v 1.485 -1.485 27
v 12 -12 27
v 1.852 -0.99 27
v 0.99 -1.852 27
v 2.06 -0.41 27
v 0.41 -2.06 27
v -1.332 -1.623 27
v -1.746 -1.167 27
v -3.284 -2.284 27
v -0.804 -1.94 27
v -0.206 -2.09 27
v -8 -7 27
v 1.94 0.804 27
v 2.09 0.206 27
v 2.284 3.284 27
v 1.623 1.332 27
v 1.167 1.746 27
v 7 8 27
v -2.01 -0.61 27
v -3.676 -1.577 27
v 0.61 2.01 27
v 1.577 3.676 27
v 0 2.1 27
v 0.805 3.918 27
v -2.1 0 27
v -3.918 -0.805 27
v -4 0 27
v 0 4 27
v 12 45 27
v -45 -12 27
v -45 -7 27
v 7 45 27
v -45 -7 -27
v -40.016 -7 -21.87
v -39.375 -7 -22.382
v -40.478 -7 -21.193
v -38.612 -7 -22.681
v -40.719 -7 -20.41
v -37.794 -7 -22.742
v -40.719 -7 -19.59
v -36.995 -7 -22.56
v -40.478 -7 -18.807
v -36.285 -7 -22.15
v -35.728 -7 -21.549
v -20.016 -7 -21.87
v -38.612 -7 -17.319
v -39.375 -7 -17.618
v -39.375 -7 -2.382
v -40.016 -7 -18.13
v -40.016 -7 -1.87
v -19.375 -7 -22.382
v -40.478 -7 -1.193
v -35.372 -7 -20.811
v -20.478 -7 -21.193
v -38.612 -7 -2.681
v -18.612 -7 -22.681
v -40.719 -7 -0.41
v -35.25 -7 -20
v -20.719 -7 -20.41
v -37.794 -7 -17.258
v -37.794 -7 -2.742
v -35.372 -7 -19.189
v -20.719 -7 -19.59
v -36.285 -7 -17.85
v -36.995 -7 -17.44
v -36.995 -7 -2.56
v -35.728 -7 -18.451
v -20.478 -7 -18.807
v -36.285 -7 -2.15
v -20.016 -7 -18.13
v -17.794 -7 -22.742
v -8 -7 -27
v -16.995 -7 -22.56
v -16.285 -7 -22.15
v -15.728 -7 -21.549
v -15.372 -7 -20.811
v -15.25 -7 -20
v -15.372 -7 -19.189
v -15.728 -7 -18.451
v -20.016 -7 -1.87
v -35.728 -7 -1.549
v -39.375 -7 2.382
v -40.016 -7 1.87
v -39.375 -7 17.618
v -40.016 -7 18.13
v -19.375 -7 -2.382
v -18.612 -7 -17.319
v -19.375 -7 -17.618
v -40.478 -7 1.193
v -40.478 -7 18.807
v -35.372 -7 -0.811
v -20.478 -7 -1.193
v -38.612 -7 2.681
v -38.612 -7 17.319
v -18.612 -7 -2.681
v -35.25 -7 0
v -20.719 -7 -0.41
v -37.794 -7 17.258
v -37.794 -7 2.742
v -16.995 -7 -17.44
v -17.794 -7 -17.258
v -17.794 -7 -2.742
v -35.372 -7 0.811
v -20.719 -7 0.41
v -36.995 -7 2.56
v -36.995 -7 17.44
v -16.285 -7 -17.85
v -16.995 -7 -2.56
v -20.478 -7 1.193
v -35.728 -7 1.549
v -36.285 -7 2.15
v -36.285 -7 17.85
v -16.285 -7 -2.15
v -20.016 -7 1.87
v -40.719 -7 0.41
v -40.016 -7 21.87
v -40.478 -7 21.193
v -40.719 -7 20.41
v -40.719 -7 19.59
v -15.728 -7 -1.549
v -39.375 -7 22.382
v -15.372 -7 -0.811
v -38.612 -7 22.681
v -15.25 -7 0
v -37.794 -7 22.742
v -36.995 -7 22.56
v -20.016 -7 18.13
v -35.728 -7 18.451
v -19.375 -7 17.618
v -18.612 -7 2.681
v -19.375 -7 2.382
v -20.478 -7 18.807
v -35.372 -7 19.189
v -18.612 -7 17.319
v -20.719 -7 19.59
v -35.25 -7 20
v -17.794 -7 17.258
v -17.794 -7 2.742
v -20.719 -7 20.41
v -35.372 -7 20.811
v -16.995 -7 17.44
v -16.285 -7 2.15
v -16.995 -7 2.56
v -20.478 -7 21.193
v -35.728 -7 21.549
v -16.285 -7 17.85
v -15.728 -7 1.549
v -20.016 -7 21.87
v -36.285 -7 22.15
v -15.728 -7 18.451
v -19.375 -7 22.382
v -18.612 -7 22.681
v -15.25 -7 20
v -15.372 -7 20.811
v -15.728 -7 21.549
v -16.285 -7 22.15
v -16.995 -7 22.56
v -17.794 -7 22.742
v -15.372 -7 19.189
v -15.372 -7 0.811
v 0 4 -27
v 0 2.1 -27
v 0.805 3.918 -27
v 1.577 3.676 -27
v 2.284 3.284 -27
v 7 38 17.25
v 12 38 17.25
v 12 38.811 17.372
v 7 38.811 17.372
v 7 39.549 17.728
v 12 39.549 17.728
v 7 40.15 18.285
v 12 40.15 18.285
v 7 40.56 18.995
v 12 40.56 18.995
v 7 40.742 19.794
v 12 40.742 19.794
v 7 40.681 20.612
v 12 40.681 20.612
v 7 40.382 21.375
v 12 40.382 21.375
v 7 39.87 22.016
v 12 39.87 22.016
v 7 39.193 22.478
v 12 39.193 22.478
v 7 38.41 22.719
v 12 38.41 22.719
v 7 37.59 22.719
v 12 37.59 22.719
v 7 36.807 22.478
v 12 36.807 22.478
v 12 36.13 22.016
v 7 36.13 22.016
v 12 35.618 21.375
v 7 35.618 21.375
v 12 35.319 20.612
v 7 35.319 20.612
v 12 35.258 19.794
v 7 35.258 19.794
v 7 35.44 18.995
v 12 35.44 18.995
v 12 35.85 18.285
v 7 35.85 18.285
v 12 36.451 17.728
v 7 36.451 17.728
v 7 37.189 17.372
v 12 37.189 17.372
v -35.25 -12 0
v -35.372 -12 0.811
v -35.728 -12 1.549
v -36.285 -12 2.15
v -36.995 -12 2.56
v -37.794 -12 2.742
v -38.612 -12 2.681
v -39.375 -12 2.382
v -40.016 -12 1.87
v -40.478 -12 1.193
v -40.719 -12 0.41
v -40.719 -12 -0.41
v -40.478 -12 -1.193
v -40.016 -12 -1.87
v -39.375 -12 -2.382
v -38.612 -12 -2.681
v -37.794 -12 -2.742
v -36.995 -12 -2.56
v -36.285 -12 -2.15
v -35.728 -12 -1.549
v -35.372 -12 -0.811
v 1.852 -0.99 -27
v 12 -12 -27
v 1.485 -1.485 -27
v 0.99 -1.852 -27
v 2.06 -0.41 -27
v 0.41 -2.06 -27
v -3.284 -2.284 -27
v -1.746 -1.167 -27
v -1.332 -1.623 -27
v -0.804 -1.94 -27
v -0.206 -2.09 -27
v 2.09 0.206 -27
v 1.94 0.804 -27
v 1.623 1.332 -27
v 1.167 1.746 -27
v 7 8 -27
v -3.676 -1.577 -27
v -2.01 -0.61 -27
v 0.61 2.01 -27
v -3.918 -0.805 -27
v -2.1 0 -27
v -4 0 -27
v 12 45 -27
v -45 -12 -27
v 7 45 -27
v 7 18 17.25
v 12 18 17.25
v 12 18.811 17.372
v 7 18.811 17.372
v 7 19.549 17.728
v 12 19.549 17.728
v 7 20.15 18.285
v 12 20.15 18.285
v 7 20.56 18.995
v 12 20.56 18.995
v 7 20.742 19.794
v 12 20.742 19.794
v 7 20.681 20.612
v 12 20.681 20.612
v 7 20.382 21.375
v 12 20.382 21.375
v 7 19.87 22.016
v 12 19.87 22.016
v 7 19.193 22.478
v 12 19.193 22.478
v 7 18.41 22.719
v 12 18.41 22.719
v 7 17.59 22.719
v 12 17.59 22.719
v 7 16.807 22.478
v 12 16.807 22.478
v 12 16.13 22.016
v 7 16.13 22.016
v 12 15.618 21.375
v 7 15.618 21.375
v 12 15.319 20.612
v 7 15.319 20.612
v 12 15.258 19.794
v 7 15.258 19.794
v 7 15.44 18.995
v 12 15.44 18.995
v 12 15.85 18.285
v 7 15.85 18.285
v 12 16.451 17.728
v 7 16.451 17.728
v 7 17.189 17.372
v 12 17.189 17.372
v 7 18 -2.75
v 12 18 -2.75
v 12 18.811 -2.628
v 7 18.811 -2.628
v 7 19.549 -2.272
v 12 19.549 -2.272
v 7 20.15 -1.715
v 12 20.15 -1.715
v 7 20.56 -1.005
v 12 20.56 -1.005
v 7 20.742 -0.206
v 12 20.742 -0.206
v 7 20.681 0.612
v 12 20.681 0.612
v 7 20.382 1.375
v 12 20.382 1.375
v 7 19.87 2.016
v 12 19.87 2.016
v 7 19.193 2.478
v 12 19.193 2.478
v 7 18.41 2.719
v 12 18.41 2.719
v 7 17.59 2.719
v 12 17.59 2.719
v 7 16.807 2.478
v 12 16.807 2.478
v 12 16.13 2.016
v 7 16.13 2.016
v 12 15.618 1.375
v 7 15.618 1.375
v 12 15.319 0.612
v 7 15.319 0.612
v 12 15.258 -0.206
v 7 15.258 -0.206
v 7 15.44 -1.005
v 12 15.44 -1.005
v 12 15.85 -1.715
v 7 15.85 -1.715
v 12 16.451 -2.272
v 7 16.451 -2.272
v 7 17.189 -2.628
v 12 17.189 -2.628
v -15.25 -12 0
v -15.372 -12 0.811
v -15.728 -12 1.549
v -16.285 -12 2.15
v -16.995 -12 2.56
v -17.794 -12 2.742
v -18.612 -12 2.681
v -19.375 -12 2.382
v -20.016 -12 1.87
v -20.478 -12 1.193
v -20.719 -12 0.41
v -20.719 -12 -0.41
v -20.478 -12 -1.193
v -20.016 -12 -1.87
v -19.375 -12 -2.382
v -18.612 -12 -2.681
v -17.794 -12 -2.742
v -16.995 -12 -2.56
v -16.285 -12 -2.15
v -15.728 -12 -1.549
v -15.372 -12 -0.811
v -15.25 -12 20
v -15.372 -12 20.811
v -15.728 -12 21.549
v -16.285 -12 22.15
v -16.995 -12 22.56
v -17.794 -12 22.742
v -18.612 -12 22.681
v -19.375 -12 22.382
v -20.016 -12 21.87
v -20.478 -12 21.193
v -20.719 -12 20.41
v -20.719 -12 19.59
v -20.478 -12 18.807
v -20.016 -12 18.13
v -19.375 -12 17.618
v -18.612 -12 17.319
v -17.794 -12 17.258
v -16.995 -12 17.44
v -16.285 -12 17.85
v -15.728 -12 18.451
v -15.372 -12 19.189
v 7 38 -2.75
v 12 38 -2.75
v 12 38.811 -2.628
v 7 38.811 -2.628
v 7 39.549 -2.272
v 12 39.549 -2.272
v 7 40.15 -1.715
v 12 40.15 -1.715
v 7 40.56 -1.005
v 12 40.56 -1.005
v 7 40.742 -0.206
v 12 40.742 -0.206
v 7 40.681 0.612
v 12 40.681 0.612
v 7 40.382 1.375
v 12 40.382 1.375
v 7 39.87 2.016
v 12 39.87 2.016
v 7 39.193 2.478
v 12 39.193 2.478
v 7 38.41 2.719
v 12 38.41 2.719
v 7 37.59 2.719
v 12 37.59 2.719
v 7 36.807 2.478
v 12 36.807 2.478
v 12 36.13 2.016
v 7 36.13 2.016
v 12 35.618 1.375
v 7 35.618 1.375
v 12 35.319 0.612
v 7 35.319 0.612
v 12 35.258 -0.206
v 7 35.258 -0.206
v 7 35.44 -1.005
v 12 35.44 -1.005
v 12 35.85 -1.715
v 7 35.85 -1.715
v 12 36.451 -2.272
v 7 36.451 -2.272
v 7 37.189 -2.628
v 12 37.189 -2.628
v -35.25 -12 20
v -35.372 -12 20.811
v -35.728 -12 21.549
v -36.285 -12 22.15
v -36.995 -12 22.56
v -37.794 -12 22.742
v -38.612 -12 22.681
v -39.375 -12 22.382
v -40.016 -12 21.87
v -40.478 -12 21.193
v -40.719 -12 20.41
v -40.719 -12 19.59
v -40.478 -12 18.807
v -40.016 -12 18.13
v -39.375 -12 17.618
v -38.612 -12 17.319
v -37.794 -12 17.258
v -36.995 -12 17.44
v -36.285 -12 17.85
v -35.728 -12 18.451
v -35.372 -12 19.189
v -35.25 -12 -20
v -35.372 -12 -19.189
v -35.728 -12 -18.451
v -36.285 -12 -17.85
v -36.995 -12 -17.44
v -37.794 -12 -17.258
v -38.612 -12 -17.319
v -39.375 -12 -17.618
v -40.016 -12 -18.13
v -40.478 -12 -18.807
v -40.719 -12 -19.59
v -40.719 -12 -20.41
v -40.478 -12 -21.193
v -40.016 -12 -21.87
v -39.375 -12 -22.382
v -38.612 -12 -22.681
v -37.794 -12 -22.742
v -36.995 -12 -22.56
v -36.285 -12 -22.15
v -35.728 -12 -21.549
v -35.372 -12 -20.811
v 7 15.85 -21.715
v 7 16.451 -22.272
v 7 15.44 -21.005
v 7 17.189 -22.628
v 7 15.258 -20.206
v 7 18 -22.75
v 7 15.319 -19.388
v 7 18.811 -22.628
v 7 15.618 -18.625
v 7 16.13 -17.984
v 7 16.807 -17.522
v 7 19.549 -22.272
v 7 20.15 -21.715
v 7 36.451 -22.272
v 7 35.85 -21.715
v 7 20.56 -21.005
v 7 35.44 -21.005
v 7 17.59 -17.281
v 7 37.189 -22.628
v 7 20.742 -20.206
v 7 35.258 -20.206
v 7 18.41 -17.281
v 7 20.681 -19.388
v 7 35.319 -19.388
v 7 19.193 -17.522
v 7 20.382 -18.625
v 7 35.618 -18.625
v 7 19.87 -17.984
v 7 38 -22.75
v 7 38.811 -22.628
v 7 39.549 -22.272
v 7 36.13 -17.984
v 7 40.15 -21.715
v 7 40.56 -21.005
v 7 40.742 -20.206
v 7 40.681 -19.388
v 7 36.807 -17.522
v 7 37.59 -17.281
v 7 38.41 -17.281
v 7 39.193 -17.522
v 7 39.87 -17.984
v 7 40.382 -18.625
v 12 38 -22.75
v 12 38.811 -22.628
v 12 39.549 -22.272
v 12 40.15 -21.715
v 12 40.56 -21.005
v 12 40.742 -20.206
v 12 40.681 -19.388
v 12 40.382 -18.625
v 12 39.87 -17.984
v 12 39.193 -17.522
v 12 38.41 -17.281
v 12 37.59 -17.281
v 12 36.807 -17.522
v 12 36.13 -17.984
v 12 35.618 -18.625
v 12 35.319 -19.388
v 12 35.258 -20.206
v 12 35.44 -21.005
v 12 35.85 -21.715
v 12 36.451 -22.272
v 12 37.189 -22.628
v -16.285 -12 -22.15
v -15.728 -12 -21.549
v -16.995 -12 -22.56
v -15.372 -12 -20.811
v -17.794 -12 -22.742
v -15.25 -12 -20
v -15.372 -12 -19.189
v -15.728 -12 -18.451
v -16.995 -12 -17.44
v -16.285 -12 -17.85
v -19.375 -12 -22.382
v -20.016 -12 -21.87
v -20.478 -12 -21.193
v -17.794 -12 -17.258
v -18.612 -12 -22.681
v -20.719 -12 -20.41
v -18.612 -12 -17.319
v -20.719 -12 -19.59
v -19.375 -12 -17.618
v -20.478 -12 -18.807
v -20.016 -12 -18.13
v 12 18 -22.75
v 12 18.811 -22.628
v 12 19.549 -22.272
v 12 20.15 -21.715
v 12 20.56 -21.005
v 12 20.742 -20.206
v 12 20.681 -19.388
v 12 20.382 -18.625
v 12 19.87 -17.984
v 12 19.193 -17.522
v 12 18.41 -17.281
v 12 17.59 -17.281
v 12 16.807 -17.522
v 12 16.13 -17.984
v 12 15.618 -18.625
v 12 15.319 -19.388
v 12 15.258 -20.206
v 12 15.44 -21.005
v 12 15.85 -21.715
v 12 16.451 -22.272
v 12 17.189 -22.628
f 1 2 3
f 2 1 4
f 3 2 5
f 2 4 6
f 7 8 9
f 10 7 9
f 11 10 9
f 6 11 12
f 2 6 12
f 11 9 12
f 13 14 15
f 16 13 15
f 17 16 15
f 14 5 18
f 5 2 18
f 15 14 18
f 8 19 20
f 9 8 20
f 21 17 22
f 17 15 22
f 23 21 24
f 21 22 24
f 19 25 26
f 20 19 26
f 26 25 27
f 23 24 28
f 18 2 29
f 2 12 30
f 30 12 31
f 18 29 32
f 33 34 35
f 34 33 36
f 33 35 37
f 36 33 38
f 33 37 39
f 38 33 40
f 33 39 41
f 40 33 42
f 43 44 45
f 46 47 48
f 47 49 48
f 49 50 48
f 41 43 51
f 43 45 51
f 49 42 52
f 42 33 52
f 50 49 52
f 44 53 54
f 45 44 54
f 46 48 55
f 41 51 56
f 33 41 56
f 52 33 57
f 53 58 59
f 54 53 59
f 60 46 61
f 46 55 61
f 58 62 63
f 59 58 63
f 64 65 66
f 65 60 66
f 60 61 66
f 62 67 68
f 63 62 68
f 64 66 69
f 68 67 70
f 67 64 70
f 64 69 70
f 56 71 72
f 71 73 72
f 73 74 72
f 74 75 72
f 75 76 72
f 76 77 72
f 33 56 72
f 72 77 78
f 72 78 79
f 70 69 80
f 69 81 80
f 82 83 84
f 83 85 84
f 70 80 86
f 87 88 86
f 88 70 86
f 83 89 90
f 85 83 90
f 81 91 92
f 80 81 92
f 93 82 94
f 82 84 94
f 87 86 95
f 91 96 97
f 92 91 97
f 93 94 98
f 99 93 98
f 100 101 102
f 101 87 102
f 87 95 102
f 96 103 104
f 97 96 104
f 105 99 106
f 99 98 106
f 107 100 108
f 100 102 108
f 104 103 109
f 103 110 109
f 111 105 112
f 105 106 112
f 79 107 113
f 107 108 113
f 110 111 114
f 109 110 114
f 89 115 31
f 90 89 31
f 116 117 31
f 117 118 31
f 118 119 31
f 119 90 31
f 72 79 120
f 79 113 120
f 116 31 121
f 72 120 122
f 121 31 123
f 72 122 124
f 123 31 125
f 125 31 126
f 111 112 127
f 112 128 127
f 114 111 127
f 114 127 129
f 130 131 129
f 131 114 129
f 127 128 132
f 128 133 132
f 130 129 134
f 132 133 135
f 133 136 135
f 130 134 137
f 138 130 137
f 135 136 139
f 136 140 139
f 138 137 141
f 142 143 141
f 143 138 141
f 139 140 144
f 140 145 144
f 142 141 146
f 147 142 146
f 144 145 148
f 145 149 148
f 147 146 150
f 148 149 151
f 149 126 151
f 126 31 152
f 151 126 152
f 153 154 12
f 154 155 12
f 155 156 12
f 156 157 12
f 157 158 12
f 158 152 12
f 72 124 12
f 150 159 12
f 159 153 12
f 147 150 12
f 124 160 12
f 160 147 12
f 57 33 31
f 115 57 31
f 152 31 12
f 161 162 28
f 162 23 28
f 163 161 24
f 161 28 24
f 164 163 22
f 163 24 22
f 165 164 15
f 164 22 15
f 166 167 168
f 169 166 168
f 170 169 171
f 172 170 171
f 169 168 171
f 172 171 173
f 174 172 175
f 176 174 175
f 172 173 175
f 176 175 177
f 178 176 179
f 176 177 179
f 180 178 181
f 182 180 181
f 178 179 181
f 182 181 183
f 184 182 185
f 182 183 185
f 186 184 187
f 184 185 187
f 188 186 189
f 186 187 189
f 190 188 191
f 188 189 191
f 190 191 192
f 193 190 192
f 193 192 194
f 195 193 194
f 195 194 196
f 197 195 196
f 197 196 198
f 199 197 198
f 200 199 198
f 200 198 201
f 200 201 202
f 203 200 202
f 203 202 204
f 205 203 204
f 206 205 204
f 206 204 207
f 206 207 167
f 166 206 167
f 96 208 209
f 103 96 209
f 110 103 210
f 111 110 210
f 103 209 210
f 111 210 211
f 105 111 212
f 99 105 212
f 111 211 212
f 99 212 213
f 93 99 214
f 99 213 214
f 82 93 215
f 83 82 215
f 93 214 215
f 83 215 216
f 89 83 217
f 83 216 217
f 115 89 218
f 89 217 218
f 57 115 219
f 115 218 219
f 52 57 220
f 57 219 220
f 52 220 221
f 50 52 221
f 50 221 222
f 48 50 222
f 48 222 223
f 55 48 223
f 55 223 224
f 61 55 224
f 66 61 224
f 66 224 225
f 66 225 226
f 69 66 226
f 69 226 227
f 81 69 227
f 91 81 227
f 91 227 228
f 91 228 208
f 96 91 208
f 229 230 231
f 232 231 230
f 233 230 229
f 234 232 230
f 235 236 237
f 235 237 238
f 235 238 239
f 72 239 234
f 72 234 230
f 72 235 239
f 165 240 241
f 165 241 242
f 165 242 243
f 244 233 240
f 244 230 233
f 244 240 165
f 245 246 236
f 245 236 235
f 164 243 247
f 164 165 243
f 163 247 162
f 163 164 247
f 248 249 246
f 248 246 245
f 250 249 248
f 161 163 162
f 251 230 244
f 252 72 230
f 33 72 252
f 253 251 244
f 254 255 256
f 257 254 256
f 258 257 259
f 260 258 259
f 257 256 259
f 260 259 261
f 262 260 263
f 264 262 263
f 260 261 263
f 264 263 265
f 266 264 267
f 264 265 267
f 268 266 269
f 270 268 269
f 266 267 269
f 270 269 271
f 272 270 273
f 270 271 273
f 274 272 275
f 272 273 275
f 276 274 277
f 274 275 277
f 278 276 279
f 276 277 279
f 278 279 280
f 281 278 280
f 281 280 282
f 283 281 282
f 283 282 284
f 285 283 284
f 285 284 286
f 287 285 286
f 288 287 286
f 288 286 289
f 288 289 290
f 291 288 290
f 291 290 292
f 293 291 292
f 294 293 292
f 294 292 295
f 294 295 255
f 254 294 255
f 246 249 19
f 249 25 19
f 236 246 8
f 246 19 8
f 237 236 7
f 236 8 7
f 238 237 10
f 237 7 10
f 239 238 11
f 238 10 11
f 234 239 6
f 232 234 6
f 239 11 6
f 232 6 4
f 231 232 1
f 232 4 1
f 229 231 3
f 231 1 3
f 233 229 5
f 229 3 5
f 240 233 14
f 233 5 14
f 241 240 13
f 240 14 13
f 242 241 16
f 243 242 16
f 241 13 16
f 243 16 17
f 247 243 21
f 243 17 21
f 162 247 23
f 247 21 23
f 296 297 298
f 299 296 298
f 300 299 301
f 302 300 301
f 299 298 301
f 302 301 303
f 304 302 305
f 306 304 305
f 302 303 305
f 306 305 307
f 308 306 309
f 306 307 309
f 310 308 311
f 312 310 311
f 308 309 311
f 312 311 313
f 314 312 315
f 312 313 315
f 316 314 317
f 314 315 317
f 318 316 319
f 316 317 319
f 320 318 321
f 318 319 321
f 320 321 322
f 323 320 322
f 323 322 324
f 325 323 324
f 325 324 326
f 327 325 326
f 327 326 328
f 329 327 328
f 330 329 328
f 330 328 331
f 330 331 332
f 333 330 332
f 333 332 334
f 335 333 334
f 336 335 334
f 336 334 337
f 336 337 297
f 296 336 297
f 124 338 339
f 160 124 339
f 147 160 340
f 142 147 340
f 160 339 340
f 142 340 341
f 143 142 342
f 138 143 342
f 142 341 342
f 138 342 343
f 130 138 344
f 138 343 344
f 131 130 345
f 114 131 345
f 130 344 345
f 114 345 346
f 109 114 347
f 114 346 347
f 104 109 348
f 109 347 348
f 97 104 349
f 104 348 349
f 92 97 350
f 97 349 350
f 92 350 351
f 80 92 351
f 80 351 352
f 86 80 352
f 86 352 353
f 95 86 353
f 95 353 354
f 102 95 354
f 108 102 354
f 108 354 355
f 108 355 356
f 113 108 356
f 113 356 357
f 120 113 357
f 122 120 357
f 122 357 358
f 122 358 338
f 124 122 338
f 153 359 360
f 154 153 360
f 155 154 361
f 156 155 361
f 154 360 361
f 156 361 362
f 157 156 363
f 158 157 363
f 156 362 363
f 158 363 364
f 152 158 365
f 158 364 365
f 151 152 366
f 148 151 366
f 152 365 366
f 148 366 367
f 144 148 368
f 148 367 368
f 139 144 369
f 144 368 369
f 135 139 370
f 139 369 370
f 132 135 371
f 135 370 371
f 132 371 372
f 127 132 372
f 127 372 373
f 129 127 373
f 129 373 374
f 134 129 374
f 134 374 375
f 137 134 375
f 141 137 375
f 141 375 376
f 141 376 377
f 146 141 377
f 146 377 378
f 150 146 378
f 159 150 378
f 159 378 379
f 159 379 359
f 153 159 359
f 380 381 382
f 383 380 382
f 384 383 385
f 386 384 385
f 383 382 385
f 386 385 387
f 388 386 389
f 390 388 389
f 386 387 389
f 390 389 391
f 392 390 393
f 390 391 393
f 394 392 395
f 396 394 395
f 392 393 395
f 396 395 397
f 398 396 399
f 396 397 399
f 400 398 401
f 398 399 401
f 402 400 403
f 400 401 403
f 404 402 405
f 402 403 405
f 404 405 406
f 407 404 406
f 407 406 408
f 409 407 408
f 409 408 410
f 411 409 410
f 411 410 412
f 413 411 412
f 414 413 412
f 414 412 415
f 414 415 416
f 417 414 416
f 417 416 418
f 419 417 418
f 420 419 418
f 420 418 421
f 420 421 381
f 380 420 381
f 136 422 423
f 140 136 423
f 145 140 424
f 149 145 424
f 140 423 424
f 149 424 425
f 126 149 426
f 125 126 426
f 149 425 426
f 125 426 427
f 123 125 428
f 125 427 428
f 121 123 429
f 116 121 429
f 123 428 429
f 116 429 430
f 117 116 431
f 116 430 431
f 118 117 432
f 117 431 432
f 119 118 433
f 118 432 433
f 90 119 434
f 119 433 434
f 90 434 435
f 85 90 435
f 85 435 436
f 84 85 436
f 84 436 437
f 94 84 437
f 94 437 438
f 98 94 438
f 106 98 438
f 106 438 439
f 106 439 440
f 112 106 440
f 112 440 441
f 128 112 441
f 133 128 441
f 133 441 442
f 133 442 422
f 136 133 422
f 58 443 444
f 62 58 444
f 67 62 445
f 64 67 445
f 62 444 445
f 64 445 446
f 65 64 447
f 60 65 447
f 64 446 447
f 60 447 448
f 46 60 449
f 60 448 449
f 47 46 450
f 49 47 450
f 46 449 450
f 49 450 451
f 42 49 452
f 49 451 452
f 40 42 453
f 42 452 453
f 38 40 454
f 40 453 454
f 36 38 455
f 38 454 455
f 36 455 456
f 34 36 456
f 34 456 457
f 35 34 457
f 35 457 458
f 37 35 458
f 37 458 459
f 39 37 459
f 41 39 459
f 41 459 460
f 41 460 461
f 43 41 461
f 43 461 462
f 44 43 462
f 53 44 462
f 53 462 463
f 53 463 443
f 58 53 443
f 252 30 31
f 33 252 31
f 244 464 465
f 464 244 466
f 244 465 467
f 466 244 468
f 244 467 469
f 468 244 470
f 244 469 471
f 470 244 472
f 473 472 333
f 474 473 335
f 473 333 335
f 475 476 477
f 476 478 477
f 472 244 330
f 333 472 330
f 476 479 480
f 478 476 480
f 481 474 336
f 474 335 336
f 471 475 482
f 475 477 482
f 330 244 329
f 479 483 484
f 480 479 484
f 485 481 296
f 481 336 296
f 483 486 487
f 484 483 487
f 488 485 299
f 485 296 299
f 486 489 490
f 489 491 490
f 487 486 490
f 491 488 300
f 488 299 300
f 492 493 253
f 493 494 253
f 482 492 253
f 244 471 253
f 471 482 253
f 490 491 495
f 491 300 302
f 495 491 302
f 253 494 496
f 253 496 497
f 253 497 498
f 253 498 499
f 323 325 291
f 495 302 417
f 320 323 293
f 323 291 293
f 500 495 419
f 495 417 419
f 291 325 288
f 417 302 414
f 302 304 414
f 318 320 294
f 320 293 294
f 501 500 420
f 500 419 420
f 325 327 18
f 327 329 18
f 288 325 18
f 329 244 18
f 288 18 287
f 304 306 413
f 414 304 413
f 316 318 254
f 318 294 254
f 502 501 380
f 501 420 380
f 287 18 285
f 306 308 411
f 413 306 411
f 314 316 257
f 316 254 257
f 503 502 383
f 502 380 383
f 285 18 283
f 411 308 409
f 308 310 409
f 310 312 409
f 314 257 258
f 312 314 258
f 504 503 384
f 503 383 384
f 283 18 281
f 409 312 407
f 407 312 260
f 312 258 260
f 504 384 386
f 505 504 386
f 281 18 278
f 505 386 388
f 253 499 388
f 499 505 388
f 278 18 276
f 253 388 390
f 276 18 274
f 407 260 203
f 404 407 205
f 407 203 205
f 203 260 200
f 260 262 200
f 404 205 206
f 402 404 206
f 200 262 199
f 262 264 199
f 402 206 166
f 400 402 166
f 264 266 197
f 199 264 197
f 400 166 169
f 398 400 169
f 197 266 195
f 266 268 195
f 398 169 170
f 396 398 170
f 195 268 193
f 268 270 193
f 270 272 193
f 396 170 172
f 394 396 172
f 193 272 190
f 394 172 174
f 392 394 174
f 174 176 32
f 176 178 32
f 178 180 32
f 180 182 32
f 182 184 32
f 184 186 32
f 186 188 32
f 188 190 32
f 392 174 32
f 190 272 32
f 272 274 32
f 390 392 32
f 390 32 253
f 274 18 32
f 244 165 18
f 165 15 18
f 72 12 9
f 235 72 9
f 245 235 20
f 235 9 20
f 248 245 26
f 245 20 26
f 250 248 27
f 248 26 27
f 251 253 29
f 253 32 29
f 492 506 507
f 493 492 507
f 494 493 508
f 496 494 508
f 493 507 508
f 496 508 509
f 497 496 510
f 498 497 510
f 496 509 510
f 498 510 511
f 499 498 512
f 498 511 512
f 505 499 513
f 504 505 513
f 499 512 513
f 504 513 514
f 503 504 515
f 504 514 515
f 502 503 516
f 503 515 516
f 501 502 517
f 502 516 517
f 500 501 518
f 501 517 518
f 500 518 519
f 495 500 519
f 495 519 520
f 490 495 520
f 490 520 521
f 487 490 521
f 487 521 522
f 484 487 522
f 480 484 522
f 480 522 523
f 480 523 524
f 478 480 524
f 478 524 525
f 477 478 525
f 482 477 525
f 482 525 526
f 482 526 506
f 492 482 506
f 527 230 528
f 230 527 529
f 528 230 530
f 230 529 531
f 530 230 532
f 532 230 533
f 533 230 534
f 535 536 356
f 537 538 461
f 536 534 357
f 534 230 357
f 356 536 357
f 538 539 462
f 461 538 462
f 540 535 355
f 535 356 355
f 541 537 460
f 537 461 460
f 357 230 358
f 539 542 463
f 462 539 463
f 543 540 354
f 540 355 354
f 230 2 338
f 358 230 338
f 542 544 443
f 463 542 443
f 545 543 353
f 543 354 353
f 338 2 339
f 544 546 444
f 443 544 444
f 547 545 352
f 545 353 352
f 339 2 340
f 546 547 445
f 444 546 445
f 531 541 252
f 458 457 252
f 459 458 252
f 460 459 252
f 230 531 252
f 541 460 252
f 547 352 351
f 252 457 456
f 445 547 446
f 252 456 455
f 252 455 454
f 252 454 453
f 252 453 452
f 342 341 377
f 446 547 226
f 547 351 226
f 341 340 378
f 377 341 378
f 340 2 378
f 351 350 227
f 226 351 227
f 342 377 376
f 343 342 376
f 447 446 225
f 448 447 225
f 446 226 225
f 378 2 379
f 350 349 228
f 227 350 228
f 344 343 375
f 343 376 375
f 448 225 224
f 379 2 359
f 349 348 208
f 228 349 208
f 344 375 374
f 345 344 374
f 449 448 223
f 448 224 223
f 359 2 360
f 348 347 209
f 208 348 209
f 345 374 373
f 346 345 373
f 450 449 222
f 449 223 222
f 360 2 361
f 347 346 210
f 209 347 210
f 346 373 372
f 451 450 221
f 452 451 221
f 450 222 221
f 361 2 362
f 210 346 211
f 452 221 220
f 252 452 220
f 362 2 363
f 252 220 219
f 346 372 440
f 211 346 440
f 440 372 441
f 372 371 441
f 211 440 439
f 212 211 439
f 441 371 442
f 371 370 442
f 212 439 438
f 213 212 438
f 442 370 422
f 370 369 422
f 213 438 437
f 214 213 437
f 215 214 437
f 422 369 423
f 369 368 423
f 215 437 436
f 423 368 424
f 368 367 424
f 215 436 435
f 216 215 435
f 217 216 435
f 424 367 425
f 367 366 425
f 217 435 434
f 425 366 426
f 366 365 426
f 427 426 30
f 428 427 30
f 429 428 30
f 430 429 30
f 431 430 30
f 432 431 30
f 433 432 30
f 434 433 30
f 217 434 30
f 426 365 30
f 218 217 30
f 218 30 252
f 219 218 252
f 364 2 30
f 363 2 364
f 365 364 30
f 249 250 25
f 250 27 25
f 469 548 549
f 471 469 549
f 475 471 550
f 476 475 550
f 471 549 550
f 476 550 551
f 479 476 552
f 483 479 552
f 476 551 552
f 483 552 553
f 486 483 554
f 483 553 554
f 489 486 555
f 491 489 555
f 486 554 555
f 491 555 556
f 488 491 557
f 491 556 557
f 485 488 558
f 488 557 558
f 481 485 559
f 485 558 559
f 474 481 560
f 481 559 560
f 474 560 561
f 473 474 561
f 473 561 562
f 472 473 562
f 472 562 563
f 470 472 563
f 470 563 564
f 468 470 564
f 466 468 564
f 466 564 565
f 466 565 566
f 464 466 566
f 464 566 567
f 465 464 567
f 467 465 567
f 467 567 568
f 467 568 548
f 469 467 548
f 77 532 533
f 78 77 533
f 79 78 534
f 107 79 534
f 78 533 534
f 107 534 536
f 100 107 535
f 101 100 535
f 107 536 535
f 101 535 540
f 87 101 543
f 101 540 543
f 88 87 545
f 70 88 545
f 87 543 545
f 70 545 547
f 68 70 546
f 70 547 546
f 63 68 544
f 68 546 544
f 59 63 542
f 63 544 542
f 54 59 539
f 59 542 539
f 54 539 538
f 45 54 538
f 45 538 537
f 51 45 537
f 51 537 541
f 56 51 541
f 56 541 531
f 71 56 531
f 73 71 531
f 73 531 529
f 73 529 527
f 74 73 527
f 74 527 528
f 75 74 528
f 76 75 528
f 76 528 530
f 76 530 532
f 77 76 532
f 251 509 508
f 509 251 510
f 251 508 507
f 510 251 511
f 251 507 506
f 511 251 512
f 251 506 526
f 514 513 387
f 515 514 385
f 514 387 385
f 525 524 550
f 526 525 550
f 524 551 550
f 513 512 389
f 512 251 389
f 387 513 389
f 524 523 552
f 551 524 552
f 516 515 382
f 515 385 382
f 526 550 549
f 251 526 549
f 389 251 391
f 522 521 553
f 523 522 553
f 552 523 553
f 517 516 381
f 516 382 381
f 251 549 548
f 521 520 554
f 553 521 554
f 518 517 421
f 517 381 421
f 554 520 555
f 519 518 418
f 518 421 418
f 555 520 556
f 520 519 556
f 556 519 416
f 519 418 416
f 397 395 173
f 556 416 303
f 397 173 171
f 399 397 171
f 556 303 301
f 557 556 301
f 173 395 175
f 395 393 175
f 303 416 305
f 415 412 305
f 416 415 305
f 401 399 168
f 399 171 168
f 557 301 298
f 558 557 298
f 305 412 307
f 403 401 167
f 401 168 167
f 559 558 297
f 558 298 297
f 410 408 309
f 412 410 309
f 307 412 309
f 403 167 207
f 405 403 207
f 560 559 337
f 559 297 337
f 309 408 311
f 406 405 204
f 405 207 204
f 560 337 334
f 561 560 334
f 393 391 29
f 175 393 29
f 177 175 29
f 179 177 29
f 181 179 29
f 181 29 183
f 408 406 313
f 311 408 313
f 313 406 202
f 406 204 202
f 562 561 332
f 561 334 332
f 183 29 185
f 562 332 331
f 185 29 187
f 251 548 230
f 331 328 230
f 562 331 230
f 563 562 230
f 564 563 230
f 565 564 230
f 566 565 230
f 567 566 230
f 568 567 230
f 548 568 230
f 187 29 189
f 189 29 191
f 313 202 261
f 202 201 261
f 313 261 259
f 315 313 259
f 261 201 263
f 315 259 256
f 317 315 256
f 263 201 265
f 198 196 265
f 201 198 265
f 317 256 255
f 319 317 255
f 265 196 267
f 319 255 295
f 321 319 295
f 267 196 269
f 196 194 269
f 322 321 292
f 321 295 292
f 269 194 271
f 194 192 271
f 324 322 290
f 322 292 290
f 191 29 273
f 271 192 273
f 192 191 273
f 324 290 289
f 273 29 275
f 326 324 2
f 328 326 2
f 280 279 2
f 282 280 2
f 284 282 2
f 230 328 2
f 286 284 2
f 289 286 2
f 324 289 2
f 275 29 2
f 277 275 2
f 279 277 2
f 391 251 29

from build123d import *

# Parameters (mm, degrees)
BOSS_EXTRUDE1_DEPTH      = 27
BOSS_EXTRUDE1_DEPTH_BACK = 27
CUT_EXTRUDE1_REACH       = 79.479
SKETCH2_R                = 2.75
CUT_EXTRUDE2_REACH       = 79.479
SKETCH3_R                = 2.75


with BuildPart() as part:
    # Sketch1 → Boss-Extrude1 (new, two sides: drawn at the far end of the back side and taken through both)
    with BuildSketch(Plane.XY.offset(-BOSS_EXTRUDE1_DEPTH_BACK)):
        with BuildLine():
            Line((-8, -7), (-3.283882181, -2.283882181))
            ThreePointArc((-3.283882181, -2.283882181), (-3.816774078, -1.196760476), (-4, 0))
            Line((-4, 0), (-2.1, 0))
            ThreePointArc((-2.1, 0), (1.48492424, -1.48492424), (0, 2.1))
            Line((0, 2.1), (0, 4))
            ThreePointArc((0, 4), (1.196760476, 3.816774078), (2.283882181, 3.283882181))
            Line((2.283882181, 3.283882181), (7, 8))
            Line((7, 8), (7, 45))
            Line((7, 45), (12, 45))
            Line((12, 45), (12, -12))
            Line((12, -12), (-45, -12))
            Line((-45, -12), (-45, -7))
            Line((-45, -7), (-8, -7))
        make_face()
    extrude(amount=BOSS_EXTRUDE1_DEPTH + BOSS_EXTRUDE1_DEPTH_BACK)

    # Sketch2 → Cut-Extrude1 (cut, up to next)
    with BuildSketch(Plane(origin=(12, 0, 0), x_dir=(0, 0, -1), z_dir=(1, 0, 0)), mode=Mode.PRIVATE) as cut_extrude1_sk1:
        with Locations((-20, 38)):
            Circle(SKETCH2_R)
    cut_extrude1_tool1 = extrude(cut_extrude1_sk1.sketch, amount=-CUT_EXTRUDE1_REACH, mode=Mode.PRIVATE) & part.part
    # Sketch2 → Cut-Extrude1 (cut, up to next)
    with BuildSketch(Plane(origin=(12, 0, 0), x_dir=(0, 0, -1), z_dir=(1, 0, 0)), mode=Mode.PRIVATE) as cut_extrude1_sk2:
        with Locations((0, 38)):
            Circle(SKETCH2_R)
    cut_extrude1_tool2 = extrude(cut_extrude1_sk2.sketch, amount=-CUT_EXTRUDE1_REACH, mode=Mode.PRIVATE) & part.part
    # Sketch2 → Cut-Extrude1 (cut, up to next)
    with BuildSketch(Plane(origin=(12, 0, 0), x_dir=(0, 0, -1), z_dir=(1, 0, 0)), mode=Mode.PRIVATE) as cut_extrude1_sk3:
        with Locations((20, 38)):
            Circle(SKETCH2_R)
    cut_extrude1_tool3 = extrude(cut_extrude1_sk3.sketch, amount=-CUT_EXTRUDE1_REACH, mode=Mode.PRIVATE) & part.part
    # Sketch2 → Cut-Extrude1 (cut, up to next)
    with BuildSketch(Plane(origin=(12, 0, 0), x_dir=(0, 0, -1), z_dir=(1, 0, 0)), mode=Mode.PRIVATE) as cut_extrude1_sk4:
        with Locations((-20, 18)):
            Circle(SKETCH2_R)
    cut_extrude1_tool4 = extrude(cut_extrude1_sk4.sketch, amount=-CUT_EXTRUDE1_REACH, mode=Mode.PRIVATE) & part.part
    # Sketch2 → Cut-Extrude1 (cut, up to next)
    with BuildSketch(Plane(origin=(12, 0, 0), x_dir=(0, 0, -1), z_dir=(1, 0, 0)), mode=Mode.PRIVATE) as cut_extrude1_sk5:
        with Locations((0, 18)):
            Circle(SKETCH2_R)
    cut_extrude1_tool5 = extrude(cut_extrude1_sk5.sketch, amount=-CUT_EXTRUDE1_REACH, mode=Mode.PRIVATE) & part.part
    # Sketch2 → Cut-Extrude1 (cut, up to next)
    with BuildSketch(Plane(origin=(12, 0, 0), x_dir=(0, 0, -1), z_dir=(1, 0, 0)), mode=Mode.PRIVATE) as cut_extrude1_sk6:
        with Locations((20, 18)):
            Circle(SKETCH2_R)
    cut_extrude1_tool6 = extrude(cut_extrude1_sk6.sketch, amount=-CUT_EXTRUDE1_REACH, mode=Mode.PRIVATE) & part.part
    add(cut_extrude1_tool1.solids().sort_by_distance((12, 38, 20))[0], mode=Mode.SUBTRACT)
    add(cut_extrude1_tool2.solids().sort_by_distance((12, 38, 0))[0], mode=Mode.SUBTRACT)
    add(cut_extrude1_tool3.solids().sort_by_distance((12, 38, -20))[0], mode=Mode.SUBTRACT)
    add(cut_extrude1_tool4.solids().sort_by_distance((12, 18, 20))[0], mode=Mode.SUBTRACT)
    add(cut_extrude1_tool5.solids().sort_by_distance((12, 18, 0))[0], mode=Mode.SUBTRACT)
    add(cut_extrude1_tool6.solids().sort_by_distance((12, 18, -20))[0], mode=Mode.SUBTRACT)

    # Sketch3 → Cut-Extrude2 (cut, up to next)
    with BuildSketch(Plane.XZ.offset(12), mode=Mode.PRIVATE) as cut_extrude2_sk1:
        with Locations((-38, -20)):
            Circle(SKETCH3_R)
    cut_extrude2_tool1 = extrude(cut_extrude2_sk1.sketch, amount=-CUT_EXTRUDE2_REACH, mode=Mode.PRIVATE) & part.part
    # Sketch3 → Cut-Extrude2 (cut, up to next)
    with BuildSketch(Plane.XZ.offset(12), mode=Mode.PRIVATE) as cut_extrude2_sk2:
        with Locations((-38, 0)):
            Circle(SKETCH3_R)
    cut_extrude2_tool2 = extrude(cut_extrude2_sk2.sketch, amount=-CUT_EXTRUDE2_REACH, mode=Mode.PRIVATE) & part.part
    # Sketch3 → Cut-Extrude2 (cut, up to next)
    with BuildSketch(Plane.XZ.offset(12), mode=Mode.PRIVATE) as cut_extrude2_sk3:
        with Locations((-38, 20)):
            Circle(SKETCH3_R)
    cut_extrude2_tool3 = extrude(cut_extrude2_sk3.sketch, amount=-CUT_EXTRUDE2_REACH, mode=Mode.PRIVATE) & part.part
    # Sketch3 → Cut-Extrude2 (cut, up to next)
    with BuildSketch(Plane.XZ.offset(12), mode=Mode.PRIVATE) as cut_extrude2_sk4:
        with Locations((-18, -20)):
            Circle(SKETCH3_R)
    cut_extrude2_tool4 = extrude(cut_extrude2_sk4.sketch, amount=-CUT_EXTRUDE2_REACH, mode=Mode.PRIVATE) & part.part
    # Sketch3 → Cut-Extrude2 (cut, up to next)
    with BuildSketch(Plane.XZ.offset(12), mode=Mode.PRIVATE) as cut_extrude2_sk5:
        with Locations((-18, 0)):
            Circle(SKETCH3_R)
    cut_extrude2_tool5 = extrude(cut_extrude2_sk5.sketch, amount=-CUT_EXTRUDE2_REACH, mode=Mode.PRIVATE) & part.part
    # Sketch3 → Cut-Extrude2 (cut, up to next)
    with BuildSketch(Plane.XZ.offset(12), mode=Mode.PRIVATE) as cut_extrude2_sk6:
        with Locations((-18, 20)):
            Circle(SKETCH3_R)
    cut_extrude2_tool6 = extrude(cut_extrude2_sk6.sketch, amount=-CUT_EXTRUDE2_REACH, mode=Mode.PRIVATE) & part.part
    add(cut_extrude2_tool1.solids().sort_by_distance((-38, -12, -20))[0], mode=Mode.SUBTRACT)
    add(cut_extrude2_tool2.solids().sort_by_distance((-38, -12, 0))[0], mode=Mode.SUBTRACT)
    add(cut_extrude2_tool3.solids().sort_by_distance((-38, -12, 20))[0], mode=Mode.SUBTRACT)
    add(cut_extrude2_tool4.solids().sort_by_distance((-18, -12, -20))[0], mode=Mode.SUBTRACT)
    add(cut_extrude2_tool5.solids().sort_by_distance((-18, -12, 0))[0], mode=Mode.SUBTRACT)
    add(cut_extrude2_tool6.solids().sort_by_distance((-18, -12, 20))[0], mode=Mode.SUBTRACT)


solid = part.part
